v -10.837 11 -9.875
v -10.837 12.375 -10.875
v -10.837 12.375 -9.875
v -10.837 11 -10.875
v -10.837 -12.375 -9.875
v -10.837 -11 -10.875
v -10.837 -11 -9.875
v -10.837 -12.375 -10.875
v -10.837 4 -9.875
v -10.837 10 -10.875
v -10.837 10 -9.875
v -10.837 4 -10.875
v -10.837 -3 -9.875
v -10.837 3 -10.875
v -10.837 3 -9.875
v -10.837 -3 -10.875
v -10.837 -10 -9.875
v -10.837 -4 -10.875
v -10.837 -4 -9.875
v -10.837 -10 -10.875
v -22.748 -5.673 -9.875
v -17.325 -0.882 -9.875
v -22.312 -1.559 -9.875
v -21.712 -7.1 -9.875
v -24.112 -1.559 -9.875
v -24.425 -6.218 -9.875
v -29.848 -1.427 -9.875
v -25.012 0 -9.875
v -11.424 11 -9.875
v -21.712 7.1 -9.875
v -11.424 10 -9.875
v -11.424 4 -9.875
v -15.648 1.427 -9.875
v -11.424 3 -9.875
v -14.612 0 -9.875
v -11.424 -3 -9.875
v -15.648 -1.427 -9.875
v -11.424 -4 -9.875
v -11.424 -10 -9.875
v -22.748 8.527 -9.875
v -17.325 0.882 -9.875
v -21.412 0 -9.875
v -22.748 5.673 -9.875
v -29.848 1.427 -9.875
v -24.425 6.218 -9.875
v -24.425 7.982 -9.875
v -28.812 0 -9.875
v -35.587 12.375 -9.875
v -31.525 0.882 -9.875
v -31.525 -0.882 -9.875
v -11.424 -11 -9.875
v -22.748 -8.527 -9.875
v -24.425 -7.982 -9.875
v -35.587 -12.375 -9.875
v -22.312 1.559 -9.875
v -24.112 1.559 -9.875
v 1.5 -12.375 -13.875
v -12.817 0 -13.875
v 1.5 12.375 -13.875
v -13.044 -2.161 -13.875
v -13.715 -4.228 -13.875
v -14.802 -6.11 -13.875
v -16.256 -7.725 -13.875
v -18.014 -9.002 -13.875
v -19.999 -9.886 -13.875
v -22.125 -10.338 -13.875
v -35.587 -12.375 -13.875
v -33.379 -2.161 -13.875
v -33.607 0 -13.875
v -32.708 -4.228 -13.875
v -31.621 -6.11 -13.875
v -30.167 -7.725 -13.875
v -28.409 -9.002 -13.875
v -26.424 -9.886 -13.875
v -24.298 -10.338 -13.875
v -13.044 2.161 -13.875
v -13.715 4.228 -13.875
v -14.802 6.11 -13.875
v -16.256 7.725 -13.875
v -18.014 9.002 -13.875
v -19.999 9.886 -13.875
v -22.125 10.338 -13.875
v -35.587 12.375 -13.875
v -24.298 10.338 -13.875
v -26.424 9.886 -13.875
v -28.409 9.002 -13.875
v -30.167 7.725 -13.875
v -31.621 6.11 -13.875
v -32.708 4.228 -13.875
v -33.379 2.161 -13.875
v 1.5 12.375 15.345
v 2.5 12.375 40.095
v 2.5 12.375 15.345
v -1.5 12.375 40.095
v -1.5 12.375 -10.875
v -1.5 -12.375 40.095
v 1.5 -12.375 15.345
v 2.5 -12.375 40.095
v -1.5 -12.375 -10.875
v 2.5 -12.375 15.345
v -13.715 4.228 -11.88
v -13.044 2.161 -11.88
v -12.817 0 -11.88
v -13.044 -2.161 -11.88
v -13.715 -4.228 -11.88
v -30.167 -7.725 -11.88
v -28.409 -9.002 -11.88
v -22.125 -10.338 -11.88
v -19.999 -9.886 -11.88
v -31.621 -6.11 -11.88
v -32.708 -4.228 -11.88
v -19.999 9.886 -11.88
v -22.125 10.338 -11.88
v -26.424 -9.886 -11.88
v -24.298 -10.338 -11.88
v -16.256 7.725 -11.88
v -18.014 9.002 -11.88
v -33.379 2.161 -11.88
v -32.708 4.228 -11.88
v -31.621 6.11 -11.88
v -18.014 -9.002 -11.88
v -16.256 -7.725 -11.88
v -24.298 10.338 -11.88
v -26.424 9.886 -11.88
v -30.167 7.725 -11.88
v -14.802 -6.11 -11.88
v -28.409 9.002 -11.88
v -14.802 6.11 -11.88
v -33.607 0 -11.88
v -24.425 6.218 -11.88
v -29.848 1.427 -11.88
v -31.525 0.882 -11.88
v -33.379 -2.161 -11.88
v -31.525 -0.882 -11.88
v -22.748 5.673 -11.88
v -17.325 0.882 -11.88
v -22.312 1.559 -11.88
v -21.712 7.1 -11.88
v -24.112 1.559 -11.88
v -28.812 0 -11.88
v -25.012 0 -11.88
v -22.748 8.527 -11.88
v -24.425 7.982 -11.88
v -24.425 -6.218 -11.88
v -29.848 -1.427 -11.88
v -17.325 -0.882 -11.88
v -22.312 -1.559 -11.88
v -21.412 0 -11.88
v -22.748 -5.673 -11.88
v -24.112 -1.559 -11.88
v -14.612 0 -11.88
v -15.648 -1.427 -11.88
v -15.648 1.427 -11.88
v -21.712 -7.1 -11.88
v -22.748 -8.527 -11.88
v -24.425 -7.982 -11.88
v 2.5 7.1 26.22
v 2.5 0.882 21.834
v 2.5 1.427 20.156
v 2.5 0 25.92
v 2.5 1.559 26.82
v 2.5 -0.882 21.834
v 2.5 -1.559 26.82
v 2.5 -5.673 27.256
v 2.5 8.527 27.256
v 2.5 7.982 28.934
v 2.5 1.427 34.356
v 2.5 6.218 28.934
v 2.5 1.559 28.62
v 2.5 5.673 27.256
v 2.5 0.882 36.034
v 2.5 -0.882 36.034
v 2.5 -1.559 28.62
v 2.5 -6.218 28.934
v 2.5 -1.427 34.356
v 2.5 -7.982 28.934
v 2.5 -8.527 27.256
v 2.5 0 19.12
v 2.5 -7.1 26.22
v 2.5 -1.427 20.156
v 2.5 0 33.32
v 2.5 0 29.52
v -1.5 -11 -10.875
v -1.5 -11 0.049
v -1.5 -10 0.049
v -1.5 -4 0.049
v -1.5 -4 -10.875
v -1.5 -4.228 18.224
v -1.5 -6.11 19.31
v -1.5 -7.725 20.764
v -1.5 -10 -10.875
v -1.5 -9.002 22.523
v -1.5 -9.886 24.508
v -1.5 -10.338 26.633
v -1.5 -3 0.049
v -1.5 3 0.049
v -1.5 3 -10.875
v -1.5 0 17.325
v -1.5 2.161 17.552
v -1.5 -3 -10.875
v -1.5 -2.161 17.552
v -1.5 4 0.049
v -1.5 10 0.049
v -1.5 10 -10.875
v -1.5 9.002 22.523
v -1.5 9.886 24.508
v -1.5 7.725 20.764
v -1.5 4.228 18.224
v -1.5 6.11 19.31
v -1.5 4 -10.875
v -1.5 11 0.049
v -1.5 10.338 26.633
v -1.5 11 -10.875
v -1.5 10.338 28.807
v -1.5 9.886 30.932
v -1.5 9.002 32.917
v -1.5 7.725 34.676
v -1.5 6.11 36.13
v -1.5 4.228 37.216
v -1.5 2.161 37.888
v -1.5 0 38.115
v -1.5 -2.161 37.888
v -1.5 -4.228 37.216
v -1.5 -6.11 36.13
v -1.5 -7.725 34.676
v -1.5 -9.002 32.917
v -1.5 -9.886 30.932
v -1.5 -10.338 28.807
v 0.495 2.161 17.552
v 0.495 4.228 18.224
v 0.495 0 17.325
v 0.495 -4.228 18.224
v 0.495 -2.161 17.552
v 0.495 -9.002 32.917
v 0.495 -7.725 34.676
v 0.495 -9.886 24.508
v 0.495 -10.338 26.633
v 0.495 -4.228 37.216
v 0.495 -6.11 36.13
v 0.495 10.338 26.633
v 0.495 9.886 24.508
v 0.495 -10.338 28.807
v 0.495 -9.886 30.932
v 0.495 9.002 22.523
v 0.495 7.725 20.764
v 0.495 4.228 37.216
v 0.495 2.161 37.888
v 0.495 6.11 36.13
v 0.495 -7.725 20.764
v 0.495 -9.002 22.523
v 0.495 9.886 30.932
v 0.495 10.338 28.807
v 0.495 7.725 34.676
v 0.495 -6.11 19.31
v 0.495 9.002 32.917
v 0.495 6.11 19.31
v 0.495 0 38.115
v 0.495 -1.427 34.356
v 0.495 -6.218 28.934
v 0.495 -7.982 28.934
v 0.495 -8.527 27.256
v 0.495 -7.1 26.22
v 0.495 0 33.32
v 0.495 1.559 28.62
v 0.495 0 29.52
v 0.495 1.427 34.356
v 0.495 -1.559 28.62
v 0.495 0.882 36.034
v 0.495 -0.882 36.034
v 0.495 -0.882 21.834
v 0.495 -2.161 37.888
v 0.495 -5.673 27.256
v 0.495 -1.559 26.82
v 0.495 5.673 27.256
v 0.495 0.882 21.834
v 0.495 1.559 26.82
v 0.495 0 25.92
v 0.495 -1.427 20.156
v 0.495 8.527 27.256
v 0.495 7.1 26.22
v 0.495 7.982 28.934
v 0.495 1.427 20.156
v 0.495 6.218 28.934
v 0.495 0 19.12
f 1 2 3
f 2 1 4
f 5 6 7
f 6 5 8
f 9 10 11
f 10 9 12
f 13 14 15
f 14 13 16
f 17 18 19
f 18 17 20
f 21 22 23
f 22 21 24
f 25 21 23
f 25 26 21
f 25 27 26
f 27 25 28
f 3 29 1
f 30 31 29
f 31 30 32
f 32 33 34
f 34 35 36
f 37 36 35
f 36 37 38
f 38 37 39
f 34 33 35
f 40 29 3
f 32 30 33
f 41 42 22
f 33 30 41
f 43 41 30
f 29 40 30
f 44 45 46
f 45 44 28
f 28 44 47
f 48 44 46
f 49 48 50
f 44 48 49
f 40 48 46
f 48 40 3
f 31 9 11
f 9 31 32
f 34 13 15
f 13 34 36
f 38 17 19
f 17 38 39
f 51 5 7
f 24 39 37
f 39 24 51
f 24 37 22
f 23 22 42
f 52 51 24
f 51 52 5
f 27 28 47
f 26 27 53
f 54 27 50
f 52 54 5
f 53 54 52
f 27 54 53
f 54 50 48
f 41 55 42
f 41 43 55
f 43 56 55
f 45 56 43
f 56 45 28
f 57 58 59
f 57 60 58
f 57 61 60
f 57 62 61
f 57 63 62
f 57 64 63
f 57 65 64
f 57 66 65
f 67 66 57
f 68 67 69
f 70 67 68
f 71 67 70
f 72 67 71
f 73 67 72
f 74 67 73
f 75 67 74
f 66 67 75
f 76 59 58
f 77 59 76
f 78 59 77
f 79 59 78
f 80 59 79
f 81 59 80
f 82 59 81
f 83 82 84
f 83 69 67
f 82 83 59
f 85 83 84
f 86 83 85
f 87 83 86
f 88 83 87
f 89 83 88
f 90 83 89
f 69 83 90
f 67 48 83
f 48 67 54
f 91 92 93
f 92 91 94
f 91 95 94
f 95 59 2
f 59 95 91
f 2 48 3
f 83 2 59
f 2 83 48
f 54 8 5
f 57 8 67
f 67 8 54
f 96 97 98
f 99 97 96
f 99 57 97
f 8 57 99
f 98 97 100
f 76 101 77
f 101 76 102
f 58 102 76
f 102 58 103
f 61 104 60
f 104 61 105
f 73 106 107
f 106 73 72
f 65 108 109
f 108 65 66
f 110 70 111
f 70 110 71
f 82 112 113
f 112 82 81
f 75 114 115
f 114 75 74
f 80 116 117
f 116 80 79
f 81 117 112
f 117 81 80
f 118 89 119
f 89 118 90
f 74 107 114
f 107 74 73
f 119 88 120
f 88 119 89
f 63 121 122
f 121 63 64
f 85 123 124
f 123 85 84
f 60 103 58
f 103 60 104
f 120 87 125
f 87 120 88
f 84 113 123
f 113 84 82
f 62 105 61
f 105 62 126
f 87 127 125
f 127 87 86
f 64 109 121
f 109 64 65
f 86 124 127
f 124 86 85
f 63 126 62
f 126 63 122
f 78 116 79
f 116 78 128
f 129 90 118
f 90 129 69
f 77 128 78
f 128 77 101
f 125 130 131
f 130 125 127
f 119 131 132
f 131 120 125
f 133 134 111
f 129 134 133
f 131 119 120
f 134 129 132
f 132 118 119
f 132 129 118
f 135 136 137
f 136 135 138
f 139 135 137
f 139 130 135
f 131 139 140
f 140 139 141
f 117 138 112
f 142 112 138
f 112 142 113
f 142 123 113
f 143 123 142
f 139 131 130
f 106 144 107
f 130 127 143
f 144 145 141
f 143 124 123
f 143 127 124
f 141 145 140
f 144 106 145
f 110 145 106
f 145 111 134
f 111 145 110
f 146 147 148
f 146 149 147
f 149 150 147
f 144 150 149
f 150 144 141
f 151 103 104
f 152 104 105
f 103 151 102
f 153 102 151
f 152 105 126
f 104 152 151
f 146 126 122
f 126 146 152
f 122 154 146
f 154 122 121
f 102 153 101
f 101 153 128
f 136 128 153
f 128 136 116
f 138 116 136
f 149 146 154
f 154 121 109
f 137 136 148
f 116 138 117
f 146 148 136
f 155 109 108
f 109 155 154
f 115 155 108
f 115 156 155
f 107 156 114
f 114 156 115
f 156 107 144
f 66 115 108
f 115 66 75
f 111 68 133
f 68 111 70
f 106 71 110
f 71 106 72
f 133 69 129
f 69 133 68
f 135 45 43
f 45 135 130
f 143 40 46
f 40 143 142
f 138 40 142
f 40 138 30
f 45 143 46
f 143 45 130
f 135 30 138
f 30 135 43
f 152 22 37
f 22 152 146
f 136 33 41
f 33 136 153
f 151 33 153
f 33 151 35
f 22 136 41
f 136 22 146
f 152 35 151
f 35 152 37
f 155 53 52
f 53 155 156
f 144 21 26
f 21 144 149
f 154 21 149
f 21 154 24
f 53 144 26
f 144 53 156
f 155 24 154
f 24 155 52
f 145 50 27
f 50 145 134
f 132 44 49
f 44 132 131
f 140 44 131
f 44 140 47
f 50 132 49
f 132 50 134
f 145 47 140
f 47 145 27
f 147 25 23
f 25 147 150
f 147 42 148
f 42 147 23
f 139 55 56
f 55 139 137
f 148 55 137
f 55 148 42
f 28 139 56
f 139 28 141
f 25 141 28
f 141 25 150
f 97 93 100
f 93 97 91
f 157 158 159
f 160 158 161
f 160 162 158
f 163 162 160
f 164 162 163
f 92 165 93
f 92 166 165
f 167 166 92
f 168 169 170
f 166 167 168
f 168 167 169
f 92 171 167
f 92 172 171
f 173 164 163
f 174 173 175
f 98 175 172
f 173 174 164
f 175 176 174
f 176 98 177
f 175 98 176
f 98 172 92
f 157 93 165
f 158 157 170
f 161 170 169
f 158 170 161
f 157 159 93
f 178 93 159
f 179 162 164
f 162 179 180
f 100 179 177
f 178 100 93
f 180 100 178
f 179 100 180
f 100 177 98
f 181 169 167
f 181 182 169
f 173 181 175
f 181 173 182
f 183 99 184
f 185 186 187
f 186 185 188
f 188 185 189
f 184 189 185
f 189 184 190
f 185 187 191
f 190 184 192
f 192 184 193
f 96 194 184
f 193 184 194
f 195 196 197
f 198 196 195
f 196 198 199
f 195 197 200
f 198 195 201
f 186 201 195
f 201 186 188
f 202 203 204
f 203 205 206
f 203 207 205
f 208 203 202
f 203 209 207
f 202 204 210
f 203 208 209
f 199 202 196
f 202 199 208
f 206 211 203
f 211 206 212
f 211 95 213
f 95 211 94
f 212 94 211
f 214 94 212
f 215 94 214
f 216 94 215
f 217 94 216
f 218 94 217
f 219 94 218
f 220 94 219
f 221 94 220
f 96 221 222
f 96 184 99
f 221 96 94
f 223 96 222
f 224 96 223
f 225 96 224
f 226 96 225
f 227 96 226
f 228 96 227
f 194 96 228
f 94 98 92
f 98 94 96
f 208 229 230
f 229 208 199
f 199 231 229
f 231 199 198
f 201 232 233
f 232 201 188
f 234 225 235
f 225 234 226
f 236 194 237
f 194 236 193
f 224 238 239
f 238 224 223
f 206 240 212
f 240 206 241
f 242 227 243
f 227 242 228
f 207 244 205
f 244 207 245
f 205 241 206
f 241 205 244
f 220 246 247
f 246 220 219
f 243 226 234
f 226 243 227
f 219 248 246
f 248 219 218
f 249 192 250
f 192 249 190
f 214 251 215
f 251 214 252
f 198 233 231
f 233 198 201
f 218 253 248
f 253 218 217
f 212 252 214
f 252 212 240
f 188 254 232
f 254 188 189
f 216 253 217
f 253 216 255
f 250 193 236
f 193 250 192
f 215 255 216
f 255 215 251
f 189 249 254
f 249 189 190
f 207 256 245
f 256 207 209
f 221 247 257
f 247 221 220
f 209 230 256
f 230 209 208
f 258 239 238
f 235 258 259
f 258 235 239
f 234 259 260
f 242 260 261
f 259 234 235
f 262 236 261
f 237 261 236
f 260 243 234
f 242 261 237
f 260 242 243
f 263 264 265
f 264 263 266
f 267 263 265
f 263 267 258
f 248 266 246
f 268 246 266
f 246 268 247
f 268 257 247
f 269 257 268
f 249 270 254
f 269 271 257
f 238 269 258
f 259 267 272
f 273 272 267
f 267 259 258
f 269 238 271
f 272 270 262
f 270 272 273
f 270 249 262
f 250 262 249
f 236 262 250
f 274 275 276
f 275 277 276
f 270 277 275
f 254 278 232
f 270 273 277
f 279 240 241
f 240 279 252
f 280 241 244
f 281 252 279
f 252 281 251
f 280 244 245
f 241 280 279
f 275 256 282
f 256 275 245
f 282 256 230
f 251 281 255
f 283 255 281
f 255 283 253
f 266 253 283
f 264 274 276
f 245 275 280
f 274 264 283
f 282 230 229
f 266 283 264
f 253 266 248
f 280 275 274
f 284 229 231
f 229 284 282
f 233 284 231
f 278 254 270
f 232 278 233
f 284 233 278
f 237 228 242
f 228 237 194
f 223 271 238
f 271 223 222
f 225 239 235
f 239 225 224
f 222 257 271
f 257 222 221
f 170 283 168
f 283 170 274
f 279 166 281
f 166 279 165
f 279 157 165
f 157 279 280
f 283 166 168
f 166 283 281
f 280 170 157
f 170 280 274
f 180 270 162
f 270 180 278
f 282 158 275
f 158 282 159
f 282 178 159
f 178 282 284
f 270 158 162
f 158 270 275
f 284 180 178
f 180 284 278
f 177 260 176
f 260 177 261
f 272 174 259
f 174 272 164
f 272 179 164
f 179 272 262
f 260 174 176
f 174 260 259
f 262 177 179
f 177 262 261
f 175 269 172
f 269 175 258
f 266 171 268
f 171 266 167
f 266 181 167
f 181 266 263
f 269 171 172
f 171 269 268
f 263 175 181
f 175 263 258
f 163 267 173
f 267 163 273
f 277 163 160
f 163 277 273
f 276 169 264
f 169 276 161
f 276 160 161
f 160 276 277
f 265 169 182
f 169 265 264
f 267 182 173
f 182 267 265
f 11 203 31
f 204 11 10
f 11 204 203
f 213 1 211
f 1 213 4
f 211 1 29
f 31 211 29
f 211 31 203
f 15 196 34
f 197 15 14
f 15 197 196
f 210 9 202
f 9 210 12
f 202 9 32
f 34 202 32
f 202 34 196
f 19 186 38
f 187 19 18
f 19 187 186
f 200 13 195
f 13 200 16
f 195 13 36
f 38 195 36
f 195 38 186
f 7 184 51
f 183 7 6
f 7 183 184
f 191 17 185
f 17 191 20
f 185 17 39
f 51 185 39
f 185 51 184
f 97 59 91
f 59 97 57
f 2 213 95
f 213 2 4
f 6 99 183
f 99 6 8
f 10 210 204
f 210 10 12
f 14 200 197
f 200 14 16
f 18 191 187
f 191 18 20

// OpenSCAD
// file: ../motor/motor-mg995-horn-mount.scad
include <motor-mg995-config.scad>

module external_horn(horn_radius, horn_height, horn_height_whole, horn_screw_mount_radius){
  difference(){
    cube([horn_radius * 2.5, horn_radius * 2.5, horn_height * 2], true);
    translate([0, 0, -horn_height / 1.99]){
      cylinder(horn_height, horn_radius * 1.05, horn_radius * 1.05, true);
    }
  }
}

module external_horn_holes(screw_radius, screw_offset, horn_height){
    /* North screw hole */
  translate([0, screw_offset, 0]){
    cylinder(horn_height * 4, screw_radius, screw_radius, true);
  }
  /* East screw hole */
  translate([screw_offset, 0, 0]){
    cylinder(horn_height * 4, screw_radius, screw_radius, true);
  }
  /* South screw hole */
  translate([0, -screw_offset, 0]){
    cylinder(horn_height * 4, screw_radius, screw_radius, true);
  }
  /* West screw hole */
  translate([-screw_offset, 0, 0]){
    cylinder(horn_height * 4, screw_radius, screw_radius, true);
  }
  /* Center screw hole */
  translate([0, 0, 0]){
    cylinder(horn_height * 8, screw_radius * 1.2, screw_radius * 1.2, true);
  }
}

module motor_mg995_horn_mount(){
  /* Apply global properties */
  color(PRINT_COLOR){
    translate([0, 0, HORN_HEIGHT / 4]){
      difference(){
        external_horn(HORN_DIAM / 2, HORN_HEIGHT, HORN_HEIGHT_WHOLE, HORN_SCREW_MOUNT_DIAM / 2);
        external_horn_holes(HORN_SCREW_HOLE_DIAM / 2, HORN_SCREW_OFFSET, HORN_HEIGHT);
      }
    }
  }
}

module offset_motor_mg995_horn_mount(){
  translate([0, HORN_DEPTH_OFFSET, (BODY_HEIGHT + HORN_HEIGHT + HORN_HEIGHT_OFFSET) / 2]){
    motor_mg995_horn_mount();
  }
}

offset_motor_mg995_horn_mount();
// file: ../motor/motor-mg995-config.scad
/* "Resolution" of arcs */
if(str($qual) != "undef"){
  $fn = $qual;
}else{
  $fn = 64;
}
/* Constants in mm */
BODY_WIDTH = 19.5;
BODY_HEIGHT = 37.4;
BODY_DEPTH = 40.04;
HORN_DIAM = 19.8;
HORN_HEIGHT = 2.0;
HORN_HEIGHT_WHOLE = 5.5;
HORN_SCREW_MOUNT_DIAM = 9.5;
HORN_SCREW_HOLE_DIAM = 3.0;
HORN_SCREW_OFFSET = 7.1;
HORN_DEPTH_OFFSET = 10.8;
HORN_HEIGHT_OFFSET = 8.4;
MOUNT_HEIGHT = 3.7;
MOUNT_DEPTH = 7.1;
MOUNT_OFFSET_BOTTOM = 27.4;
MOUNT_HOLE_OFFSET_Y = 2.6;
MOUNT_HOLE_DIFF_X = 9.7;
MOUNT_HOLE_DIAM = 4.2;
MOUNT_SCREW_DIAM = 2.0;
/* Plastic colour */
PRINT_COLOR = [0.2, 0.2, 0.2];
// file: neck-config.scad
/* "Resolution" of arcs */
if(str($qual) != "undef"){
  $fn = $qual;
}else{
  $fn = 64;
}
/* Constants in mm */
/* Plastic colour */
PRINT_COLOR = [0.2, 0.2, 0.2];
// file: neck.scad
include <neck-config.scad>

include <../motor/motor-mg995-config.scad>
use <../motor/motor-mg995-horn-mount.scad>

module neck_rafts(){
  raft_height = 16;
  raft_width = 1;
  raft_depth = raft_height;
  raft_spacing = 7;
  translate([-raft_depth / 2, 0, (-(HORN_DIAM / 4) * 2.25) +(raft_height / 2)]){
    rotate([0, 0, -90]){
      for(i = [-1.5 : 1 : 1.5]){
        translate([i * raft_spacing, 0, 0]){
          difference(){
            cube([raft_width, raft_depth, raft_height], true);
            translate([0, -sqrt(raft_depth), sqrt(raft_height)]){
              rotate([-45, 0, 0]){
                cube([raft_width * 2, raft_depth, raft_height * 2], true);
              }
            }
          }
        }
      }
    }
  }
}

module neck(){
  /* Apply global properties */
  color(PRINT_COLOR){
    union(){
      translate([(-(HORN_DIAM / 4) * 5) + (HORN_HEIGHT / 1.3), 0, -(HORN_DIAM / 4) * 2.5]){
        motor_mg995_horn_mount();
      }
      translate([-HORN_HEIGHT * 2.5, 0, -(HORN_DIAM / 4) * 2.5]){
          cube([(HORN_DIAM / 1.8) + HORN_HEIGHT, HORN_DIAM * 1.25, HORN_HEIGHT * 1.5], true);
      }
      translate([0, 0, HORN_DIAM * 1.4]){
        rotate([0, 90, 0]){
          motor_mg995_horn_mount();
        }
      }
      translate([0, 0, HORN_HEIGHT * 0.5]){
        rotate([0, 90, 180]){
          cube([HORN_DIAM * 1.5, HORN_DIAM * 1.25, HORN_HEIGHT * 1.5], true);
        }
      }
      neck_rafts();
    }
  }
}

module offset_neck(){
  neck();
}

offset_neck();
// main file
use <neck.scad>

module neck_complete(){
  offset_neck();
}

module neck_rotate(){
  rotate([0, 0, $t * 360]){
    neck_complete();
  }
}

neck_rotate();
